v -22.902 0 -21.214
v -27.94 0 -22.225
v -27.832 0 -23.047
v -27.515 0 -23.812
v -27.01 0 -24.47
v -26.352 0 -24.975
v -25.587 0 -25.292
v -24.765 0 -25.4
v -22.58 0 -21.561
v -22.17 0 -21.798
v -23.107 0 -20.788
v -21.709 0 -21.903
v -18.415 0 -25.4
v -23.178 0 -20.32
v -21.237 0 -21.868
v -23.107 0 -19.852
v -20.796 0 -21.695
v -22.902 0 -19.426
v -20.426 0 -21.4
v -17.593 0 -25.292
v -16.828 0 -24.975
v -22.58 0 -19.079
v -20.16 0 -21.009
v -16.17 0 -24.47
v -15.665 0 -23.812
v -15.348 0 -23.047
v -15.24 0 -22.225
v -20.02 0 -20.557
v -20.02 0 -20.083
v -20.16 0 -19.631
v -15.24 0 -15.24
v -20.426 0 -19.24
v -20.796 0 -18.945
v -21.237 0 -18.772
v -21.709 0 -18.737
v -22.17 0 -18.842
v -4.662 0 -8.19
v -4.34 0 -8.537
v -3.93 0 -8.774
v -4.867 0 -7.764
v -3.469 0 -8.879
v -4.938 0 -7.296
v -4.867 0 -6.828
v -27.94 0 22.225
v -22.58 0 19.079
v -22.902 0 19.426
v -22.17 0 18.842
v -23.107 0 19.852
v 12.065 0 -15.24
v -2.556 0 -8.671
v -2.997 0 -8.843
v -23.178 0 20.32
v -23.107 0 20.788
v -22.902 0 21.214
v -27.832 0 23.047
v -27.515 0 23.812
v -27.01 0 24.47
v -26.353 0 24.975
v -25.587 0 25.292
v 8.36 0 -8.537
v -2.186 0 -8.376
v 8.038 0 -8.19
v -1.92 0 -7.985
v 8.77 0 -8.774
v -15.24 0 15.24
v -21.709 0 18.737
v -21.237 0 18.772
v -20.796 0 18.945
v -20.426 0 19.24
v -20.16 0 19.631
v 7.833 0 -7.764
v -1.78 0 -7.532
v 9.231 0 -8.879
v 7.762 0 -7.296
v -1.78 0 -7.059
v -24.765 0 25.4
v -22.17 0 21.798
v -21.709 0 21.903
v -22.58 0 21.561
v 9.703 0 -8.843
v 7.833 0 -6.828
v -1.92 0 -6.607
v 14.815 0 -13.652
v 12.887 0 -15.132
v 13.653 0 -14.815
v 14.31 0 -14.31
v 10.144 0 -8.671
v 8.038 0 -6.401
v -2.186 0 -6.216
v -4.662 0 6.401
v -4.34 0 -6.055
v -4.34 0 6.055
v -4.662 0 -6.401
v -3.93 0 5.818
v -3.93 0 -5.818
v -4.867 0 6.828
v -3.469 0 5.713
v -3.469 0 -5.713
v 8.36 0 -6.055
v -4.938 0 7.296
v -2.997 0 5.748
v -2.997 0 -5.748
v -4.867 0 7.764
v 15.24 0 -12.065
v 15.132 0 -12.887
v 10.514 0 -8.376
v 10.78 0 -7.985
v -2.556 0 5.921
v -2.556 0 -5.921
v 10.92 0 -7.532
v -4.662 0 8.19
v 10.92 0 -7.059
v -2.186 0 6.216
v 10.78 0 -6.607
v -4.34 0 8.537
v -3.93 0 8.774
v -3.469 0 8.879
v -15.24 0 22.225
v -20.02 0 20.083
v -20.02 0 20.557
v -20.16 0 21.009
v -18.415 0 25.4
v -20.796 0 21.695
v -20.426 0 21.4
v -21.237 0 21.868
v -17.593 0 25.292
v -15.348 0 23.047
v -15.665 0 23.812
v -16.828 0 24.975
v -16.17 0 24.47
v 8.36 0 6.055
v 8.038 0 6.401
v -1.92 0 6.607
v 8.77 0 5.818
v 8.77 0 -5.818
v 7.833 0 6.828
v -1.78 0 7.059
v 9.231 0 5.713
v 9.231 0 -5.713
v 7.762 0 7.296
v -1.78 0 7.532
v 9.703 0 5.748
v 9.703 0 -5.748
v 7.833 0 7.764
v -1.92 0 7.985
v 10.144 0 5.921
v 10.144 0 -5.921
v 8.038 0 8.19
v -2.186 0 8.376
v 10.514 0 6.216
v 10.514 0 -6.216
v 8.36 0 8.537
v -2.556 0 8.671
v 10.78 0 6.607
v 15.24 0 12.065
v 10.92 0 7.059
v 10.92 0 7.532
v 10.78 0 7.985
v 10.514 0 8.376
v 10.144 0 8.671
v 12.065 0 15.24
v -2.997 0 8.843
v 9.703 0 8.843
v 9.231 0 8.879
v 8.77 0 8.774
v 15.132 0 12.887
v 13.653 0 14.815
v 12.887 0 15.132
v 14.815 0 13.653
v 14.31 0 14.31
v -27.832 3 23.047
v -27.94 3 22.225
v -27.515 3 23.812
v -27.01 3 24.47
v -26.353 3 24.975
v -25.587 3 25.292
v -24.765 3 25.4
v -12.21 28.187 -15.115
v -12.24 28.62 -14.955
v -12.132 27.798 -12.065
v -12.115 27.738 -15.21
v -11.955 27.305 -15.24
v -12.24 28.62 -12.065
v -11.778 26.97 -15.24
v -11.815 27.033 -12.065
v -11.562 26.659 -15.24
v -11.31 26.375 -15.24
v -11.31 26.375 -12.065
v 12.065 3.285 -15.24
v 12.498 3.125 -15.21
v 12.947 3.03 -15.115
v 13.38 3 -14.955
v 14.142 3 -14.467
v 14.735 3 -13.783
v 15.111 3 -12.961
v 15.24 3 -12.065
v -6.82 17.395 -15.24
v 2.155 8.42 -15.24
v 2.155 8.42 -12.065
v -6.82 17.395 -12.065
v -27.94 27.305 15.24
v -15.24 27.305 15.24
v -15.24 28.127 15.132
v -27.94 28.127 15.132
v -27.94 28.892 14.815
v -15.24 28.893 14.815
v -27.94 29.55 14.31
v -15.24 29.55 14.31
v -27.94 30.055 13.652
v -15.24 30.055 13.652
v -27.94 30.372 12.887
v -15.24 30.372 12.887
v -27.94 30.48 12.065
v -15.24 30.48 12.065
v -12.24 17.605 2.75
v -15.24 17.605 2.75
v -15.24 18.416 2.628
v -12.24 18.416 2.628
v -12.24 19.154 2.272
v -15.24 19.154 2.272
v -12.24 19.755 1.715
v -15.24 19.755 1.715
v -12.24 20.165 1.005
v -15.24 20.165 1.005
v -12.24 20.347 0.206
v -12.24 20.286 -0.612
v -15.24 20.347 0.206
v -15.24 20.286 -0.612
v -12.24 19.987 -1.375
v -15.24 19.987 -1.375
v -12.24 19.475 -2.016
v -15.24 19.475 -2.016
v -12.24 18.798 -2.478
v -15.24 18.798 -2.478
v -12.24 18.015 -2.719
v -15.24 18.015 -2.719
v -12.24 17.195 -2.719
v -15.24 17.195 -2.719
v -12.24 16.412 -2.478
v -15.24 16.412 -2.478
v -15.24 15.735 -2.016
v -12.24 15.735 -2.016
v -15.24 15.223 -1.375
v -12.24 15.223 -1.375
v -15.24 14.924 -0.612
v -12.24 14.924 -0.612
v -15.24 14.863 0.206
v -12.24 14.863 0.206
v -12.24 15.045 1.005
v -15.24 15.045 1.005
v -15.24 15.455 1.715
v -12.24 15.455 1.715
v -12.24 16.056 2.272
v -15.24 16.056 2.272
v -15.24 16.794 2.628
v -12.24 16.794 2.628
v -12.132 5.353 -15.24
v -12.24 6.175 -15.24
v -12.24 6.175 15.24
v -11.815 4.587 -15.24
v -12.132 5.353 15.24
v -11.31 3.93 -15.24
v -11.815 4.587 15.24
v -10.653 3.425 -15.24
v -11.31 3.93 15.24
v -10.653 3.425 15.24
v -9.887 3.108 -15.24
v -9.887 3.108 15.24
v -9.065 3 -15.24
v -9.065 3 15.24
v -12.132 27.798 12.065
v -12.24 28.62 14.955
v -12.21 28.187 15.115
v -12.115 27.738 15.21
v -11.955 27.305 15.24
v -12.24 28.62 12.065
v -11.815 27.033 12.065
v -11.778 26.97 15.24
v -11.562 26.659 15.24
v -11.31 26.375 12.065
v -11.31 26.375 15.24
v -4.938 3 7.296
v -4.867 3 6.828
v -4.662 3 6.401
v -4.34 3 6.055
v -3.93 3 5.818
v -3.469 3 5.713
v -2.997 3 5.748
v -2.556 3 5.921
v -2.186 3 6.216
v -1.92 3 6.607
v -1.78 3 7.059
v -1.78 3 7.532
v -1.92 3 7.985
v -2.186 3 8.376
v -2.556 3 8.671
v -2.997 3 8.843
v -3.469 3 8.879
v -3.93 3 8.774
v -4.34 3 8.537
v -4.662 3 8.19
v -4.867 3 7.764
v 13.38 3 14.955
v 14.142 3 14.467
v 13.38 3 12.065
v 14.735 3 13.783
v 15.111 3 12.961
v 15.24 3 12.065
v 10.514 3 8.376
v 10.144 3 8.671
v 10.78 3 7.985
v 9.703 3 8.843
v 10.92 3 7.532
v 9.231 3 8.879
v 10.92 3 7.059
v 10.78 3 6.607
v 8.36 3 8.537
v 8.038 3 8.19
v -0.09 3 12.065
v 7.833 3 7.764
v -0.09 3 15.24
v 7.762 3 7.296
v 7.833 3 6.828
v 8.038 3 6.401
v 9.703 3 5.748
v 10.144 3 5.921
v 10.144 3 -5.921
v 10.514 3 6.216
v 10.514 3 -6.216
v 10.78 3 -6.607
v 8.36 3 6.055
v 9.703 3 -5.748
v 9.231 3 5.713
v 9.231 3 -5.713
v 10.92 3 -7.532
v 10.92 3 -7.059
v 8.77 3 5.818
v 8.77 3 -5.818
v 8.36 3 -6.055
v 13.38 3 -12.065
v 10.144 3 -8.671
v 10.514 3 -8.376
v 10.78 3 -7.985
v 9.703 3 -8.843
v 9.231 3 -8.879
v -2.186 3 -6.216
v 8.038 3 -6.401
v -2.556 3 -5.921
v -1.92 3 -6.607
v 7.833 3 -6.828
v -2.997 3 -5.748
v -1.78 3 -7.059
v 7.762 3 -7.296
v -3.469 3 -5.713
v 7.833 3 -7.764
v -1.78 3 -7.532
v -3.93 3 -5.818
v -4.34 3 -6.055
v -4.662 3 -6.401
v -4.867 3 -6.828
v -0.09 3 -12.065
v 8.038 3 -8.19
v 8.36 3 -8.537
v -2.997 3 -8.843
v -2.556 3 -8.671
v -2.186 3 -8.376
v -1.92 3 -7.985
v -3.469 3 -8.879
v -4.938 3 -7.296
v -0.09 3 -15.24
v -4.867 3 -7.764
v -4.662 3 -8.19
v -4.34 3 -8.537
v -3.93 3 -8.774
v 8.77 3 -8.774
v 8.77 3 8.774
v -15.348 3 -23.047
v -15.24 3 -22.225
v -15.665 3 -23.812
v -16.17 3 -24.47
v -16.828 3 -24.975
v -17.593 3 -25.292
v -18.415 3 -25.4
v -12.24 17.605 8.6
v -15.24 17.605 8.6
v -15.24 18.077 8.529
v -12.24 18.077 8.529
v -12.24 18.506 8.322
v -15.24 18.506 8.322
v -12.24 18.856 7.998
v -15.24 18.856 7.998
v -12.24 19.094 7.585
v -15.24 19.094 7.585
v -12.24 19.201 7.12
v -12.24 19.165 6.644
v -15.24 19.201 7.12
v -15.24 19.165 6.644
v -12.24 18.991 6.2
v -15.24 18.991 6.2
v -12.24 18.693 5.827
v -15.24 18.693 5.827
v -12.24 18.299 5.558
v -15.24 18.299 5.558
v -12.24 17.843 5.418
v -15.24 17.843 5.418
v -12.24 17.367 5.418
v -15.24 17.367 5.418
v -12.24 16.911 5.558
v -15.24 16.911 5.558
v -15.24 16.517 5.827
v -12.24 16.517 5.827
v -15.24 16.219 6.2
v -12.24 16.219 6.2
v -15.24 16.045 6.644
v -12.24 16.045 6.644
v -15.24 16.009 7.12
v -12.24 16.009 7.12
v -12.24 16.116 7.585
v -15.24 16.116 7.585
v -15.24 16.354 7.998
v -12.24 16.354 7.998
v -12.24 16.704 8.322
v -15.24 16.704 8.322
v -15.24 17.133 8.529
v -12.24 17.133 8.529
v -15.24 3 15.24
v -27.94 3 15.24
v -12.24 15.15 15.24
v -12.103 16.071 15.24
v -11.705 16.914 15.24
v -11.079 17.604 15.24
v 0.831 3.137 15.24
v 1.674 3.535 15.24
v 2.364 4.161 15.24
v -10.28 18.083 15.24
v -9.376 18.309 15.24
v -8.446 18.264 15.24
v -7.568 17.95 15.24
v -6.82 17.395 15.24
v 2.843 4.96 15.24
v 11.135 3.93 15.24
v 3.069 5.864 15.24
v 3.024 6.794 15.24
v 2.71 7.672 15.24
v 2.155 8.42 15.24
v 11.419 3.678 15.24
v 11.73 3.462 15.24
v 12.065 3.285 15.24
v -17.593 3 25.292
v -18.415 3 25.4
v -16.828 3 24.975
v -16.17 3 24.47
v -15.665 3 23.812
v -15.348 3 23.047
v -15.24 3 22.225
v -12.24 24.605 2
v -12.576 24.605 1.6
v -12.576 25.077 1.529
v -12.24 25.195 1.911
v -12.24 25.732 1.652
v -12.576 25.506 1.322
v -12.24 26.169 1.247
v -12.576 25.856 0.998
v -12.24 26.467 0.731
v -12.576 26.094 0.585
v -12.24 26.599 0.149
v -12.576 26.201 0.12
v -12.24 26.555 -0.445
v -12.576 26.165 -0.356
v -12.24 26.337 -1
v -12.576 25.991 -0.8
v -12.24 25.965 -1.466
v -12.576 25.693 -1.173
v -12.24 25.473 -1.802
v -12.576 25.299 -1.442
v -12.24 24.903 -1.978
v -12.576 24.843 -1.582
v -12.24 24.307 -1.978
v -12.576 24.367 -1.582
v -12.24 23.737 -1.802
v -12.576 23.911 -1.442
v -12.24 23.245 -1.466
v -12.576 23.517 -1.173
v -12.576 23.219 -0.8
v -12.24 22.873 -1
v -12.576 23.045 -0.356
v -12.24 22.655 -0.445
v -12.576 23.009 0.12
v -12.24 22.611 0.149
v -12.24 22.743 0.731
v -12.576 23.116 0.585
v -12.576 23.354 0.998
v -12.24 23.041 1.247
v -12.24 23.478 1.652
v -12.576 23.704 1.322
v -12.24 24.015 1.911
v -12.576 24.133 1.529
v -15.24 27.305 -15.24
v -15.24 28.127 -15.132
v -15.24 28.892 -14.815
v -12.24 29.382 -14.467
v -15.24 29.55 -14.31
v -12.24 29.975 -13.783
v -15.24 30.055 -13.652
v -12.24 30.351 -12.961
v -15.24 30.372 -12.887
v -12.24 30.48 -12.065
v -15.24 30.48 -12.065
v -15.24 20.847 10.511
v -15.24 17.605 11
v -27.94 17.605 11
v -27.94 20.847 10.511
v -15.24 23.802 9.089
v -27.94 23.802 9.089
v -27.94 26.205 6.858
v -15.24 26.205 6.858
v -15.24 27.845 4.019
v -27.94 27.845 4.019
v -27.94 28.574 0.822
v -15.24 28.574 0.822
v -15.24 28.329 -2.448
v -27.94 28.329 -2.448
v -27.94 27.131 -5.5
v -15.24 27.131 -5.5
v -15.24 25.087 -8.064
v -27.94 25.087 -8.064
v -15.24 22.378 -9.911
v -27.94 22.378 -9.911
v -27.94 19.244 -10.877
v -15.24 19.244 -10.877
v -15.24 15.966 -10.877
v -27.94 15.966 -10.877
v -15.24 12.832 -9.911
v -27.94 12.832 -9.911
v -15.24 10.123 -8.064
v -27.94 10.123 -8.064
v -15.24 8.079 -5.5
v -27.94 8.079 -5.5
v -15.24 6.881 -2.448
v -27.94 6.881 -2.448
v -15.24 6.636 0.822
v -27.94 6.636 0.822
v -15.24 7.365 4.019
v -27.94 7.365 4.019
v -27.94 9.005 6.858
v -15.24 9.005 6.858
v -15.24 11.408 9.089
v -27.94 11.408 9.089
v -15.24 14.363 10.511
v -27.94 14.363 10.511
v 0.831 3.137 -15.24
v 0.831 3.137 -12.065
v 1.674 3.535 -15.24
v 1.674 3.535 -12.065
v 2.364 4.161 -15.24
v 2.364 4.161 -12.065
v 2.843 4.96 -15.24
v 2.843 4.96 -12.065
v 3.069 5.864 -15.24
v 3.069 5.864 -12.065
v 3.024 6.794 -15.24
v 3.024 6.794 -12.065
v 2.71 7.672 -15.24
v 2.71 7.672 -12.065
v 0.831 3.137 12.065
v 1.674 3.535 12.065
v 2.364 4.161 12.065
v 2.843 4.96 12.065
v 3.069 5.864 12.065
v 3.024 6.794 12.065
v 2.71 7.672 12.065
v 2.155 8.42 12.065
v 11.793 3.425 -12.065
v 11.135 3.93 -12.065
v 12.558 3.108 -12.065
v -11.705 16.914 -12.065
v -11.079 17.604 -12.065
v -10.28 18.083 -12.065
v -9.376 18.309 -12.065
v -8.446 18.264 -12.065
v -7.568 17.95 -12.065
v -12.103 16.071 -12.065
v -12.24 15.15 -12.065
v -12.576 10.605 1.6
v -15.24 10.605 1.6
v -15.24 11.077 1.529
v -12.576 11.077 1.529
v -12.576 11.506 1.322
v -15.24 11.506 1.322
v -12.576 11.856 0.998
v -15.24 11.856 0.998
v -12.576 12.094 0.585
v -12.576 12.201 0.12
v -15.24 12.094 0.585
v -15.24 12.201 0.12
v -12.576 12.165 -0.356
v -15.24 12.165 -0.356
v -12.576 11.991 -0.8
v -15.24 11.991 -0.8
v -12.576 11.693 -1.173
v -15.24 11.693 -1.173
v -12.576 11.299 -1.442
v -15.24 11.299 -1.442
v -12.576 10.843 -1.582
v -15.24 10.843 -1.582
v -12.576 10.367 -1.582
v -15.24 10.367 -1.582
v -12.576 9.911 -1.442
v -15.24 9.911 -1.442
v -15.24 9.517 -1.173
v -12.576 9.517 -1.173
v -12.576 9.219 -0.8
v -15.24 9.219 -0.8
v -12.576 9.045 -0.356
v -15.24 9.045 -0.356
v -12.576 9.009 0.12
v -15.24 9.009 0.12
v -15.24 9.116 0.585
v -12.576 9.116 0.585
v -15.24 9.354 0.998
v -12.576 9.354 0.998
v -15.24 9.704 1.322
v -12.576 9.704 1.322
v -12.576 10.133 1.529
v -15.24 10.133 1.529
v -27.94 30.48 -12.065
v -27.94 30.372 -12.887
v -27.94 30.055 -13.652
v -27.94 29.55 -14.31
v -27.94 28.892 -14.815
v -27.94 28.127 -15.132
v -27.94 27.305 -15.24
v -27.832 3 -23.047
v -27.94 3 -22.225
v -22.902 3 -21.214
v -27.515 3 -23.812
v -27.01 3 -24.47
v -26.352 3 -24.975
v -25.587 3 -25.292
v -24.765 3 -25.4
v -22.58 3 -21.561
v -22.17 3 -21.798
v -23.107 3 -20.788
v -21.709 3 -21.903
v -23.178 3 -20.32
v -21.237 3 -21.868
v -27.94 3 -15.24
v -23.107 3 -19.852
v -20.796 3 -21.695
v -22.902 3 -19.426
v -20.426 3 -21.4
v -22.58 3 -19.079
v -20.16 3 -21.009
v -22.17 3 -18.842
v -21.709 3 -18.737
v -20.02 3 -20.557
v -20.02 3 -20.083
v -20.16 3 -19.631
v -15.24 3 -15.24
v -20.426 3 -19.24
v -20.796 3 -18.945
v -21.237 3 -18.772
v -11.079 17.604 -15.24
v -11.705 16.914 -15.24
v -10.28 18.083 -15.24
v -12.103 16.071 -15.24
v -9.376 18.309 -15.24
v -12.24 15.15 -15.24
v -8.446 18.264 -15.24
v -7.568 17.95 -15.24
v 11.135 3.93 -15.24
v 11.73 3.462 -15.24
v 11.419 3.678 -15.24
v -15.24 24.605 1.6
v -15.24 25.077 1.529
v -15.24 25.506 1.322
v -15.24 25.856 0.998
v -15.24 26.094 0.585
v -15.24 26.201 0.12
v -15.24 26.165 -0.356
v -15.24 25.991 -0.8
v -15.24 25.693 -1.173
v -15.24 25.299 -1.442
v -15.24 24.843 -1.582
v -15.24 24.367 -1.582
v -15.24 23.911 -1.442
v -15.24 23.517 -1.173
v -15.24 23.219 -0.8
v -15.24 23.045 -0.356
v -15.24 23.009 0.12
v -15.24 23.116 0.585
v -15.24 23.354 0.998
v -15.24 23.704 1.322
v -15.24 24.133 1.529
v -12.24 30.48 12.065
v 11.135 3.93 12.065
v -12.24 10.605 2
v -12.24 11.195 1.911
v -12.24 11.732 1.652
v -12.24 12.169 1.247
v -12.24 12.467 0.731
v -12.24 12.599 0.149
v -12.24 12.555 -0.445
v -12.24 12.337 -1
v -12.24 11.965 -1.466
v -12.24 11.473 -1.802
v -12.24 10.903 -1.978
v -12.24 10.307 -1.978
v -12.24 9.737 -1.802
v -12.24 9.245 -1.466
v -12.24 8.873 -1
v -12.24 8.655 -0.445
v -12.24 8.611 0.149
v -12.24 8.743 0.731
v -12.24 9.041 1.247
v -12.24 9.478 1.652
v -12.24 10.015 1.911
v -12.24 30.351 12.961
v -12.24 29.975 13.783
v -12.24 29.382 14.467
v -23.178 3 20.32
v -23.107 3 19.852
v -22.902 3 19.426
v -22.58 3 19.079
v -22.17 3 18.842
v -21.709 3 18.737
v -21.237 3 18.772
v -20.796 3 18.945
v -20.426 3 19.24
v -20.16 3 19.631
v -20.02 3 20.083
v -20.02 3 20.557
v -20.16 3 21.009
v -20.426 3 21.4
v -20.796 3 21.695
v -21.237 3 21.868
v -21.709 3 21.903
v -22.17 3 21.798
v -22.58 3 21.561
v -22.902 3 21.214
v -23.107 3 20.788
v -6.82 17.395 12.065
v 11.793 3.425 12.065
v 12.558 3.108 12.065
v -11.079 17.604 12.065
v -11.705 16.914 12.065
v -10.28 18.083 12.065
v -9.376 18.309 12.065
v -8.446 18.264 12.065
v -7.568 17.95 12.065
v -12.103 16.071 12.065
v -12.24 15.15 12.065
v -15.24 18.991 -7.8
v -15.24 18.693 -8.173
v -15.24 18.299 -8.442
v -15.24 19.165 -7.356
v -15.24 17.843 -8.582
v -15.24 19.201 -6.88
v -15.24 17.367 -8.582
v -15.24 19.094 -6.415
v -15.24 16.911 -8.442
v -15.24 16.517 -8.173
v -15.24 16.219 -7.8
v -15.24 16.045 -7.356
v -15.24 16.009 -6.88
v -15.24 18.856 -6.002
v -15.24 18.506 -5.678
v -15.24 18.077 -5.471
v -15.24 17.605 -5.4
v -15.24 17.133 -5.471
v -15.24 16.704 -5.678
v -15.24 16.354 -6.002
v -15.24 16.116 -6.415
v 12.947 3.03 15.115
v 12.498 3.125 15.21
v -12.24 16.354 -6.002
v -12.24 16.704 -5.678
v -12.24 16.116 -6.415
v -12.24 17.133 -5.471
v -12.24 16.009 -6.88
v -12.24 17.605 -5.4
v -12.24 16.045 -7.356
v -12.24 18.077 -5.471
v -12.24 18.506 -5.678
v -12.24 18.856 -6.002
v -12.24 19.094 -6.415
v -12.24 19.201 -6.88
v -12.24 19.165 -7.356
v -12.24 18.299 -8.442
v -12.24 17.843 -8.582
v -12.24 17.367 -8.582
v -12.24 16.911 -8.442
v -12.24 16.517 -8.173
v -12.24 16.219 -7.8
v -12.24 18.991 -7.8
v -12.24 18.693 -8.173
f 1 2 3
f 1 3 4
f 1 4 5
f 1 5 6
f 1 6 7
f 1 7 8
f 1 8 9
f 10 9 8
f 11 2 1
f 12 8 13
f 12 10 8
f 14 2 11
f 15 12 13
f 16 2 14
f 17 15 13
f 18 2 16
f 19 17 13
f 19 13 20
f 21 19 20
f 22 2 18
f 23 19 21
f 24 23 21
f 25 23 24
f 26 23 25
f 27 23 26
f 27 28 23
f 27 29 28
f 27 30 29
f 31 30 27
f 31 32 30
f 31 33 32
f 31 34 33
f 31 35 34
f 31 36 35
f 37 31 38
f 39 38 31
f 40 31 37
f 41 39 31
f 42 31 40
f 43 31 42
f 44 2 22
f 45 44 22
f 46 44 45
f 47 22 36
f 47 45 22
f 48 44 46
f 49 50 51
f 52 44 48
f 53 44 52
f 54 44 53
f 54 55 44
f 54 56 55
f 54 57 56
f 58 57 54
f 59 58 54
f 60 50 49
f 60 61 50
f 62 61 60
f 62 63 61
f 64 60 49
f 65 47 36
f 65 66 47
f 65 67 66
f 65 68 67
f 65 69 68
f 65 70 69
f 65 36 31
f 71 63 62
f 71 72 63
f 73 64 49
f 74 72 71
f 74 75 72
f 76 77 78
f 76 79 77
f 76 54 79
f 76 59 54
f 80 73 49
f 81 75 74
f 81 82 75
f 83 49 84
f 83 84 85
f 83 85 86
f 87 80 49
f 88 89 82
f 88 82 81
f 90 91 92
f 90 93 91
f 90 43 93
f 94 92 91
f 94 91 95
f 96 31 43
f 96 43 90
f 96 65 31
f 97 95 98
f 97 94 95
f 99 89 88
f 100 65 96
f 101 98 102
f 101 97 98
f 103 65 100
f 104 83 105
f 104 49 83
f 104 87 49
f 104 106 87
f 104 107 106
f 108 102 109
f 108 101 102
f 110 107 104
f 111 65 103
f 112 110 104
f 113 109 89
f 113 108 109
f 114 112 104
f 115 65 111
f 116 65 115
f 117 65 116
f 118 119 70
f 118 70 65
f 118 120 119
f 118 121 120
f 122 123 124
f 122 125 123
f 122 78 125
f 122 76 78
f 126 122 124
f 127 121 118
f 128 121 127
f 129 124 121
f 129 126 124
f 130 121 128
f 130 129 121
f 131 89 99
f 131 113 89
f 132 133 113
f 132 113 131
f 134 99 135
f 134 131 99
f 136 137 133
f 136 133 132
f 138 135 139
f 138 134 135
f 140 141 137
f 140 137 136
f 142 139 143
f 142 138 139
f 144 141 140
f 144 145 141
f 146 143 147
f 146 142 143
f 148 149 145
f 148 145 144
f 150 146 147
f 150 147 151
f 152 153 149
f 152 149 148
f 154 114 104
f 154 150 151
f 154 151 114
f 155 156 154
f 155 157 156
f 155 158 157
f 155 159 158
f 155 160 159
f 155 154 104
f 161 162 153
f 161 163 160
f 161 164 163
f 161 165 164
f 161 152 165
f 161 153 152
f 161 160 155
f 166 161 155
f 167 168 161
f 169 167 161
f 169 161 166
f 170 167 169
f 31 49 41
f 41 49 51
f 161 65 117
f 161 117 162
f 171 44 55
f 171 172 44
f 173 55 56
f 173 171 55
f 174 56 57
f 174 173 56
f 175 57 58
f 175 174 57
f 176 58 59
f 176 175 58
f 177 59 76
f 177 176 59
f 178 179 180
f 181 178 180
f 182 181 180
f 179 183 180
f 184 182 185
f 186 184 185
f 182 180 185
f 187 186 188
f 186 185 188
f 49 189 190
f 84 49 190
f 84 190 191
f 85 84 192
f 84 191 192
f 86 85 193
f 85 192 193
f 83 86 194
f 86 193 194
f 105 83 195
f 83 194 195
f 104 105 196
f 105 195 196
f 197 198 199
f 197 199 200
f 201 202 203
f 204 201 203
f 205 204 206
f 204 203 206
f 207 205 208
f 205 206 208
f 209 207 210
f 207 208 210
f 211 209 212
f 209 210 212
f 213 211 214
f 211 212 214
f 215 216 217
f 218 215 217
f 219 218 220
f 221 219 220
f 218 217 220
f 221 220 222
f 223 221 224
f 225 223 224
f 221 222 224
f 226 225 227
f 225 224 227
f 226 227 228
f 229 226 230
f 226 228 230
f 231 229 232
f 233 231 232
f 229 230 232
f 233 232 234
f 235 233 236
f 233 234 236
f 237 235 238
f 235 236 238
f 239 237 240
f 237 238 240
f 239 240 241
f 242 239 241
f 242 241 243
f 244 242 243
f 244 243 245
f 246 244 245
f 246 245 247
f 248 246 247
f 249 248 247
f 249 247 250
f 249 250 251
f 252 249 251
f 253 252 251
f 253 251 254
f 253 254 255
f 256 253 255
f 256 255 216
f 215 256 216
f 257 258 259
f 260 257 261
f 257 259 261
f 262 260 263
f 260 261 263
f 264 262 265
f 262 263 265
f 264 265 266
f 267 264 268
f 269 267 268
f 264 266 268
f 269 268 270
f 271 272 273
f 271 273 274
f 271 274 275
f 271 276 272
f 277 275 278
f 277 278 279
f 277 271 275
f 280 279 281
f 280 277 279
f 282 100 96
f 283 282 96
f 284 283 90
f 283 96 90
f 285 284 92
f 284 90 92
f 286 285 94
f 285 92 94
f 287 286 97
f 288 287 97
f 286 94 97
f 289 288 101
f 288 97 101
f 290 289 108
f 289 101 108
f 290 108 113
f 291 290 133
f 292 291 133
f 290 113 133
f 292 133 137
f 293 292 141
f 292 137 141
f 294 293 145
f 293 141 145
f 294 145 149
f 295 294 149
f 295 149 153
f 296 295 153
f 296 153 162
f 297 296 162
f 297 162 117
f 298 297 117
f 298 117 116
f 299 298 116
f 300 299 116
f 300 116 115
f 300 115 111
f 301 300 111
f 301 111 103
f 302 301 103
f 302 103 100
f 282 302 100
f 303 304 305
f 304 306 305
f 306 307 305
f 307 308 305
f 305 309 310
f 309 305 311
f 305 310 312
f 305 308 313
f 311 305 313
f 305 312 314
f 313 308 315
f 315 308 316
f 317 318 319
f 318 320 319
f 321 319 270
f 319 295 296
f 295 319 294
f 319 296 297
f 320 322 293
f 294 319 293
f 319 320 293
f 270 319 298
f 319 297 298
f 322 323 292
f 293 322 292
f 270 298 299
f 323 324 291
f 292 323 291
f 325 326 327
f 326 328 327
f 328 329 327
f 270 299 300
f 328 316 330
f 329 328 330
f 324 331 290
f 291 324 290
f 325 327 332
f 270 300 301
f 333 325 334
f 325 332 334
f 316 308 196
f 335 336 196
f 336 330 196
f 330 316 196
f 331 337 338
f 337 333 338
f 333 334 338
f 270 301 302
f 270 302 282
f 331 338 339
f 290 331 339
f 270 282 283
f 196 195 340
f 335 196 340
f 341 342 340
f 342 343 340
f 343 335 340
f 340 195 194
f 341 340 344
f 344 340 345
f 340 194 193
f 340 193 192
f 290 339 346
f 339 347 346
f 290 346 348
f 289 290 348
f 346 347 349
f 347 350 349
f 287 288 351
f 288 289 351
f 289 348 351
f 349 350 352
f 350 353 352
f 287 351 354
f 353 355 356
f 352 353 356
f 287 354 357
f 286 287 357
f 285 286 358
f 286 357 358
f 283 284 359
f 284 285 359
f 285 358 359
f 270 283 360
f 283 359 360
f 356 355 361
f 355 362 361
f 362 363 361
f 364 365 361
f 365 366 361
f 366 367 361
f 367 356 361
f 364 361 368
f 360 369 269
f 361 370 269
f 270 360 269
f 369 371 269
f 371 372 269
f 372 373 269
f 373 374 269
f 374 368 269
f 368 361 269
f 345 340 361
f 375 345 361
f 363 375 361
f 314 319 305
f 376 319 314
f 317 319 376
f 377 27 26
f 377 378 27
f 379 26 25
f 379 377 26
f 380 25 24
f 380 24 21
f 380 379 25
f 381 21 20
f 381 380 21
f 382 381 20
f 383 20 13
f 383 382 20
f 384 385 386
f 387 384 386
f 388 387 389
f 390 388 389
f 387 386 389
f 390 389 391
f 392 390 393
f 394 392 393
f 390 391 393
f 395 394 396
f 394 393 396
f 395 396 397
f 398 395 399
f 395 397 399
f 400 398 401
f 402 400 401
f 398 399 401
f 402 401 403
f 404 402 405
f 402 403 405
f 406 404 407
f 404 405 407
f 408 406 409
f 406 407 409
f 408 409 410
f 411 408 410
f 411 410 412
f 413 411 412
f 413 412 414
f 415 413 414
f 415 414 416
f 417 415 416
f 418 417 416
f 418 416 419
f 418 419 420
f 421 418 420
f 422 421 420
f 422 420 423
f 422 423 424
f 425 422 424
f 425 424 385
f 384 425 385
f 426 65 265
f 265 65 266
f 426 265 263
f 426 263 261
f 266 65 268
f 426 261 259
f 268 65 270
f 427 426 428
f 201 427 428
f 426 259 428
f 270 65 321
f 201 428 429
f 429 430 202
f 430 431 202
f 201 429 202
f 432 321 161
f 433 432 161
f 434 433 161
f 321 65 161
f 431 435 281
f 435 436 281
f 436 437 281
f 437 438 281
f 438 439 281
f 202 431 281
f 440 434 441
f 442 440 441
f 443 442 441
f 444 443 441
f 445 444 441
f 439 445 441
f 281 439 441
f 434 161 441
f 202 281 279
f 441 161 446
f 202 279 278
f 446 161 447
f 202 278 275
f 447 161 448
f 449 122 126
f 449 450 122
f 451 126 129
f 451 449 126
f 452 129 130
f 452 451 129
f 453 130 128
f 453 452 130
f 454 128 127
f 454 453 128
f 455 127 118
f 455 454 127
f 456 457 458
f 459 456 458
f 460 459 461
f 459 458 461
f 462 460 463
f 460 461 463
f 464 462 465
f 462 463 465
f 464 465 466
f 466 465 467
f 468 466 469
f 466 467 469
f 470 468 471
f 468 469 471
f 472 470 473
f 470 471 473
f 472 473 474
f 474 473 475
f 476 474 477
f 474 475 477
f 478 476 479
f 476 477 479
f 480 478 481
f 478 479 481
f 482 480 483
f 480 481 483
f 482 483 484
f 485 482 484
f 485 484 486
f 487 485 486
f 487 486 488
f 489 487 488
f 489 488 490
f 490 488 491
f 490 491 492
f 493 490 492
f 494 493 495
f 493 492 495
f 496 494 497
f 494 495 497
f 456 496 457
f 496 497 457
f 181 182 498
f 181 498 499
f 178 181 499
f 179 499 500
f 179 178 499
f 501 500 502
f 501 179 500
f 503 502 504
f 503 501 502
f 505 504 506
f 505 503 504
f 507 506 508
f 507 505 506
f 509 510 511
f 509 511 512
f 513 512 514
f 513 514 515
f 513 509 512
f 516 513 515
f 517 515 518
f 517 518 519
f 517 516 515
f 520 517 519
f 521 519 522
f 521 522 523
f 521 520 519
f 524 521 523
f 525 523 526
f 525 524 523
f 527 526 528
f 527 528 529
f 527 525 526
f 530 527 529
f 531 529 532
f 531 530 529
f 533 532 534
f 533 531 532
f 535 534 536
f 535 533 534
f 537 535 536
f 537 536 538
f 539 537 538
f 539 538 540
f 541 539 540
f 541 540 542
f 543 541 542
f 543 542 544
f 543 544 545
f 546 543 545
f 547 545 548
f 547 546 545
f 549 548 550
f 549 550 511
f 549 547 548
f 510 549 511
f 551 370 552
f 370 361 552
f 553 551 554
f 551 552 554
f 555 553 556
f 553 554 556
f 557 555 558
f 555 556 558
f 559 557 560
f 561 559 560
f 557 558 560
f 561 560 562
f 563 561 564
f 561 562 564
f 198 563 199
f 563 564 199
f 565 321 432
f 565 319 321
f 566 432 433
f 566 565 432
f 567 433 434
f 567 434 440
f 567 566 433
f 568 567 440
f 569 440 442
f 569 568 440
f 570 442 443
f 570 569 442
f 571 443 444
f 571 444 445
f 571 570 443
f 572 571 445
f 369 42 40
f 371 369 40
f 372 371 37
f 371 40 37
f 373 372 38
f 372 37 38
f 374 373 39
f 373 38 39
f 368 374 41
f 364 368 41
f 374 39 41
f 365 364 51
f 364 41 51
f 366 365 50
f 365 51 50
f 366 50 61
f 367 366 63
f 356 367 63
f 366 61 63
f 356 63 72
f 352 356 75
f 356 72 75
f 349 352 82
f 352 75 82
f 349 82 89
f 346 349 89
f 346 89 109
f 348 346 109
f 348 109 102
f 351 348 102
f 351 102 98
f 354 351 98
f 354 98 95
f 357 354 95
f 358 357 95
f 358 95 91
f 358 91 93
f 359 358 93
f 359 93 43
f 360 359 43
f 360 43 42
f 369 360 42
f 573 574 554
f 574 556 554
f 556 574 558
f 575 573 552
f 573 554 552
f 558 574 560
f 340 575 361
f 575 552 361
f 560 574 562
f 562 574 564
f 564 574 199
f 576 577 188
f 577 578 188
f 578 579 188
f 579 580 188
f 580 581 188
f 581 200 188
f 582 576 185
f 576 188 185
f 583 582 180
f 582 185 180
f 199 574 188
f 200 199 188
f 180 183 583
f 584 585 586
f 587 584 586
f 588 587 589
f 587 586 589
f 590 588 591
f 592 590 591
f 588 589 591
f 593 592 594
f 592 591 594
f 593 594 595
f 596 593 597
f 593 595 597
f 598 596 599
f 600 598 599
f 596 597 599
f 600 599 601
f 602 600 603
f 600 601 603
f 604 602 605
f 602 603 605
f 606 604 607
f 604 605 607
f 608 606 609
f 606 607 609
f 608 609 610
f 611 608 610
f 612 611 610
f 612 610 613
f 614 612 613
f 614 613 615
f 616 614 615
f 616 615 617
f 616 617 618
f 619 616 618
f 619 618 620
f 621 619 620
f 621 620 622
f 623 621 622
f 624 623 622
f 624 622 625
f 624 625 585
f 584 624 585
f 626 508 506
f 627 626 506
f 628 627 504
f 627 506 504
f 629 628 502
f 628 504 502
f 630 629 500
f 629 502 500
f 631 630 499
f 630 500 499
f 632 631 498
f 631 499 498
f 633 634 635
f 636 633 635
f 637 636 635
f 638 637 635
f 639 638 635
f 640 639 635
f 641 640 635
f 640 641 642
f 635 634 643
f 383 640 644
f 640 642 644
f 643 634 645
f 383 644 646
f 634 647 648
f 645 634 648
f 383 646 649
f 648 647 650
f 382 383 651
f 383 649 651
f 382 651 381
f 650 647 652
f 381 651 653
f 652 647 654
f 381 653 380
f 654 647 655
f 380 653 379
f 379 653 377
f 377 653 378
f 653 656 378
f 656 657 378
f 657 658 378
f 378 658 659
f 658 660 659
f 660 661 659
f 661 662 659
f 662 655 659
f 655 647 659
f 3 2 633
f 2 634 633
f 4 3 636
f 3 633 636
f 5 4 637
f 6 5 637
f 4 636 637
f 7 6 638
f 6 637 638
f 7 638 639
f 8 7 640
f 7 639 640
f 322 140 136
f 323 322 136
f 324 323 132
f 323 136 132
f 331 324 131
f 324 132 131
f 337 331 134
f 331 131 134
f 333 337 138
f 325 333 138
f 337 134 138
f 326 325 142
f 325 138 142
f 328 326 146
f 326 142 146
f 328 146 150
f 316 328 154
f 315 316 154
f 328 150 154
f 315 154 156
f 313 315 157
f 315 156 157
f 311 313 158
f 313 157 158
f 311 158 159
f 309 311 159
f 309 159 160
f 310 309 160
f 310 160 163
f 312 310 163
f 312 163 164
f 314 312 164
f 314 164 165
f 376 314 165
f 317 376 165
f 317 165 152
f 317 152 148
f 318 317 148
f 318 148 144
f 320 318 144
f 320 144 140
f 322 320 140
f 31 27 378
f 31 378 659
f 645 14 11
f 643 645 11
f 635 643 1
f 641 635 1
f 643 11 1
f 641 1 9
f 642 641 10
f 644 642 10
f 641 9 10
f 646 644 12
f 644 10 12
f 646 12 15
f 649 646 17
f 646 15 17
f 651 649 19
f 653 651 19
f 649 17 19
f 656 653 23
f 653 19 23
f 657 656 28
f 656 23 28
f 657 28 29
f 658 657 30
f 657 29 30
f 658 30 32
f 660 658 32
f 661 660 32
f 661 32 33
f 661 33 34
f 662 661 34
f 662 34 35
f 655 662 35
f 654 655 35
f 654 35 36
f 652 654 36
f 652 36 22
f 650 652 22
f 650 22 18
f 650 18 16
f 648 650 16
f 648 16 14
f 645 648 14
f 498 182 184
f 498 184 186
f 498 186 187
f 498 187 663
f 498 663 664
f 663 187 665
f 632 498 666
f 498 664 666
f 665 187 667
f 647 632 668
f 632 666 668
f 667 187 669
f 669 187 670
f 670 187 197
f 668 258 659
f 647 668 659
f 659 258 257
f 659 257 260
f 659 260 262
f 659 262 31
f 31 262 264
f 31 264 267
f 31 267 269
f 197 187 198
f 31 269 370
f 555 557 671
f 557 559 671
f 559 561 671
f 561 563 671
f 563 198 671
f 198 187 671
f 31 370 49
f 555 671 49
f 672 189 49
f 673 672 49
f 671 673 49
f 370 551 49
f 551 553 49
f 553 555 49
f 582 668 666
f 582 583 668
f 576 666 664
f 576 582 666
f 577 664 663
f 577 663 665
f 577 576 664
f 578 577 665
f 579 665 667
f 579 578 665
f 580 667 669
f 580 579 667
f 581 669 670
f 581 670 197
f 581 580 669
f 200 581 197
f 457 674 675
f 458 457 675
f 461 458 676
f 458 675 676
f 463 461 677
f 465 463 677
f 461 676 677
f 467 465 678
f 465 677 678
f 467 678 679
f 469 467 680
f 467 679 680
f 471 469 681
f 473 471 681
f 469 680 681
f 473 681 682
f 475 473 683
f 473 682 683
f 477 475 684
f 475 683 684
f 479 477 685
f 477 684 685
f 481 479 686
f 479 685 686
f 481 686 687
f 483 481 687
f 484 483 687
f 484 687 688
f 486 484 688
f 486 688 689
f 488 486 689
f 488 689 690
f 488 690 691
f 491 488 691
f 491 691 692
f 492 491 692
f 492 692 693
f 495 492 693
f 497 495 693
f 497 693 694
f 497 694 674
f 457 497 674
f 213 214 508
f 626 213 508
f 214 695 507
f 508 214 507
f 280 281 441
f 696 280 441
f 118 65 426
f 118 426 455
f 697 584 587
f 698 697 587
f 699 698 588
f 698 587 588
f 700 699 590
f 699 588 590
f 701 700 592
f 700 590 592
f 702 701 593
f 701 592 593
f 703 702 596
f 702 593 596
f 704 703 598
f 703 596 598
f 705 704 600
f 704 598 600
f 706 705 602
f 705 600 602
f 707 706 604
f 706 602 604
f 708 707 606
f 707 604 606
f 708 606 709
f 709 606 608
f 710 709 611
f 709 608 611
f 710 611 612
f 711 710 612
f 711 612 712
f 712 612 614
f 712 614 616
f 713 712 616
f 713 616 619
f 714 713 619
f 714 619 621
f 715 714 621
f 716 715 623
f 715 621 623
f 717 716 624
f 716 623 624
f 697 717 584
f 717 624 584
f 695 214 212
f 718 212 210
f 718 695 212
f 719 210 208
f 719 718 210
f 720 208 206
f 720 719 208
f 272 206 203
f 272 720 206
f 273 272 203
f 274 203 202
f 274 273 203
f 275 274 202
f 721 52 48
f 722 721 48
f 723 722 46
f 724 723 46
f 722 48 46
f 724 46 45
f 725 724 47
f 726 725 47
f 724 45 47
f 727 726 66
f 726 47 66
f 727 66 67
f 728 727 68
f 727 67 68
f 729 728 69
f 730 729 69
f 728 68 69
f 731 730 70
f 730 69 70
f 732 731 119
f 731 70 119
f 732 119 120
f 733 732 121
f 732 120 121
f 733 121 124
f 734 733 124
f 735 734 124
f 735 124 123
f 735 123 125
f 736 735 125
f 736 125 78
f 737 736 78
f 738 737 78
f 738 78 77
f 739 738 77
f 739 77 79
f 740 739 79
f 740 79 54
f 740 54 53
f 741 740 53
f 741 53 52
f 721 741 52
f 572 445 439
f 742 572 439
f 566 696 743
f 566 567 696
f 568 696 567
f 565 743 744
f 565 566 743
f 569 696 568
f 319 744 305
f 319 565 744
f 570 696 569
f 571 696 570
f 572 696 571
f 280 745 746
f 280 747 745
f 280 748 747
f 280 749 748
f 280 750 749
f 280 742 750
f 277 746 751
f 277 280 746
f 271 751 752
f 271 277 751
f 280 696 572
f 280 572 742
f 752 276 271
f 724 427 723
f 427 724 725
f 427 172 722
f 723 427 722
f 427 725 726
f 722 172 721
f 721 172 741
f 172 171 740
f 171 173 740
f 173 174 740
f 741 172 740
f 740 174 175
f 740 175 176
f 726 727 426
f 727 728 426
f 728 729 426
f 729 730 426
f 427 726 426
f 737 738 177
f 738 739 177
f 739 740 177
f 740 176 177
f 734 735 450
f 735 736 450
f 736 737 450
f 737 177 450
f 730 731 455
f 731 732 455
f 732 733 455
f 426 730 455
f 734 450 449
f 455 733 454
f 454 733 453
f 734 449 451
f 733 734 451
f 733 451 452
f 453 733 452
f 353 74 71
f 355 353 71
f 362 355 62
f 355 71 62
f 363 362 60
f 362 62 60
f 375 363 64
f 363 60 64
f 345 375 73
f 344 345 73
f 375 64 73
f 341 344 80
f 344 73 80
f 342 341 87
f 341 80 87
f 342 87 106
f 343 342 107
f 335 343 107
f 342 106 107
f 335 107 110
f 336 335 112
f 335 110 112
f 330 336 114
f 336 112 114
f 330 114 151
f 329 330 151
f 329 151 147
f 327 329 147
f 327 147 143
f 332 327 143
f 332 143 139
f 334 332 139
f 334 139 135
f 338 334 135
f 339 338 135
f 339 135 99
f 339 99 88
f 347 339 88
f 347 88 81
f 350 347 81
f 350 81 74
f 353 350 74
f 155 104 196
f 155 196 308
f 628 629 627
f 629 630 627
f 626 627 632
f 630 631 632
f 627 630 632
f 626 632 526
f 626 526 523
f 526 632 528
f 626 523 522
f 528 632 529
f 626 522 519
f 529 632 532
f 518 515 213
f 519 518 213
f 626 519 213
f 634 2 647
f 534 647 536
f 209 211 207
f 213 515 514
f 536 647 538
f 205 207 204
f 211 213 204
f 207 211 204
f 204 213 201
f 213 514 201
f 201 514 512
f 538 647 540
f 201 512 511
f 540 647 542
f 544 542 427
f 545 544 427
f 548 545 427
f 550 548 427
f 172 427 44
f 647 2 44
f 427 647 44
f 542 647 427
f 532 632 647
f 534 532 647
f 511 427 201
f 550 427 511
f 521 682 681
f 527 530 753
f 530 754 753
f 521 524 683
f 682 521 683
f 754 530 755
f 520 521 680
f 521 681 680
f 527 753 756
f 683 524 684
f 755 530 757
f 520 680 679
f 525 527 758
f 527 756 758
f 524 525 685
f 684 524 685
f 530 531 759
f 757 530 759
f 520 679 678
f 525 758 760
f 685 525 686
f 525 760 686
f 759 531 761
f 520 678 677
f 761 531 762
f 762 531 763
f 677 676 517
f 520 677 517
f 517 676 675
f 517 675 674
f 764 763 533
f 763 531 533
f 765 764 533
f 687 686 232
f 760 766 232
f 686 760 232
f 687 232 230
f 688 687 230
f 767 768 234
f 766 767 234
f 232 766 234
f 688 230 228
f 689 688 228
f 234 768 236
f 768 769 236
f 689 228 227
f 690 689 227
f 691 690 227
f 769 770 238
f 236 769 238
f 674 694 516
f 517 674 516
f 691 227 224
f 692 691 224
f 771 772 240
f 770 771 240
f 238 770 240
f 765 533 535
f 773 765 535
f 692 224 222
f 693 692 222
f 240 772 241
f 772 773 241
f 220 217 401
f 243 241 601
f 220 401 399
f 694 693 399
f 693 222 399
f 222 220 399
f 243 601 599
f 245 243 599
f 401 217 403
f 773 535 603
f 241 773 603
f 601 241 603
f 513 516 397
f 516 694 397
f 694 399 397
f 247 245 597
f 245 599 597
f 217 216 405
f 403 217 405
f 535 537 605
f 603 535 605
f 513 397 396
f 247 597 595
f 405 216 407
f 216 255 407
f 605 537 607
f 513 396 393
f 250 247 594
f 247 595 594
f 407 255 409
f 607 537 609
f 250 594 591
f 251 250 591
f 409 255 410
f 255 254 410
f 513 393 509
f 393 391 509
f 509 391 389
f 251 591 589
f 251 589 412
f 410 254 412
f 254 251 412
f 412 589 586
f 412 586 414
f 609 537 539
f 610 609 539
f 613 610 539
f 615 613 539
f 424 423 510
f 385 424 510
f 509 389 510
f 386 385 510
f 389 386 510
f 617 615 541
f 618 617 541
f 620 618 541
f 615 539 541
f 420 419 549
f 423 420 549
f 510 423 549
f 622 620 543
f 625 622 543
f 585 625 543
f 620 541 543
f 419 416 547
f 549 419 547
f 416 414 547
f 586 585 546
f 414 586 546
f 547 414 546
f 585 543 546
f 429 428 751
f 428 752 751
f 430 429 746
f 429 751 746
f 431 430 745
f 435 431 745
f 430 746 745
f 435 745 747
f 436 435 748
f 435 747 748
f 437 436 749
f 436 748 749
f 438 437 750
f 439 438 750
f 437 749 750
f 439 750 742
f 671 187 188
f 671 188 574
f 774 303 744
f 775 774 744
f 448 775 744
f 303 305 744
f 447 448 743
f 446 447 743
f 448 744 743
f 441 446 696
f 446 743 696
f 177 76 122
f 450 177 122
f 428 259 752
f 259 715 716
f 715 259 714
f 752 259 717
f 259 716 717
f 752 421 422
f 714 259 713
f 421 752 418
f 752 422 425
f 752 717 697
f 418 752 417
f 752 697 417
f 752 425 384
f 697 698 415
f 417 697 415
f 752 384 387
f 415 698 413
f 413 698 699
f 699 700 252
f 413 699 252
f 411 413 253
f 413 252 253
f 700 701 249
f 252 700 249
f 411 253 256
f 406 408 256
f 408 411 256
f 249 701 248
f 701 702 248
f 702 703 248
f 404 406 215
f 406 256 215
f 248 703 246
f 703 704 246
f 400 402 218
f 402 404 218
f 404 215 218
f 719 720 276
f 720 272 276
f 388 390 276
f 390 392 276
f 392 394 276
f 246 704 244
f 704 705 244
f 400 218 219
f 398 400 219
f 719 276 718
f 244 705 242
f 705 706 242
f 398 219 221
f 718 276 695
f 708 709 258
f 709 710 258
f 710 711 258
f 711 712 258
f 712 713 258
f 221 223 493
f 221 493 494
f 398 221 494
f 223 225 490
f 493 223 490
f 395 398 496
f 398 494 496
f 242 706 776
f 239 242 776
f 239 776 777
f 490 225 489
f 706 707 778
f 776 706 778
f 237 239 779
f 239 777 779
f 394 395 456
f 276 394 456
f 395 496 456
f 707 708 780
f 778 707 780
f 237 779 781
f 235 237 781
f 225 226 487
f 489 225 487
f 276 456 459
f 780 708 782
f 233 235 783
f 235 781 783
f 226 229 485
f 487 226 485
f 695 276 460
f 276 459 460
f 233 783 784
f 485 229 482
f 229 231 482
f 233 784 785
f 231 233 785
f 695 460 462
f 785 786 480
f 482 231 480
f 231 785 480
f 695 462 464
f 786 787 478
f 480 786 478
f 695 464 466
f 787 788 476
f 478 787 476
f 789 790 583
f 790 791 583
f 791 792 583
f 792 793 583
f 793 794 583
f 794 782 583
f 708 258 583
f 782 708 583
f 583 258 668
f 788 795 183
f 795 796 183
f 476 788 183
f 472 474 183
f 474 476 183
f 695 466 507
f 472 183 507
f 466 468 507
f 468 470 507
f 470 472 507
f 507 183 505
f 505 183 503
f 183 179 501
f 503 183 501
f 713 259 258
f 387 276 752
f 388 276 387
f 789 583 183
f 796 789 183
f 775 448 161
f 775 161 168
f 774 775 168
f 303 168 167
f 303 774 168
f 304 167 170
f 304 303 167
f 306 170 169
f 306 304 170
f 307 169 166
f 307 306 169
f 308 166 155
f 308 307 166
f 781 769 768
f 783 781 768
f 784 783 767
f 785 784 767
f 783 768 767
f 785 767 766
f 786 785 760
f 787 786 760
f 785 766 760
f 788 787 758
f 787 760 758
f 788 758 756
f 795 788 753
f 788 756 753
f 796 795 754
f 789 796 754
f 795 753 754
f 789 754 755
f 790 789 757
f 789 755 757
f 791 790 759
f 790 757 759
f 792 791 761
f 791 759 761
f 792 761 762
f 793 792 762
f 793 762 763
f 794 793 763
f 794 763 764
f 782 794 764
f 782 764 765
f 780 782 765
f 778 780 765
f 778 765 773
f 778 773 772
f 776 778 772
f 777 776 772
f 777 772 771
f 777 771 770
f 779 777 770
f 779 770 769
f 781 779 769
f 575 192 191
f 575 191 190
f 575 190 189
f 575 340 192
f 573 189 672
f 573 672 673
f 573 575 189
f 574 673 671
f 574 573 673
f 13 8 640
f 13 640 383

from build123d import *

# Parameters (mm, degrees)
SKETCH1_W                      = 30.48
SKETCH1_H                      = 30.48
BOSS_EXTRUDE1_DEPTH            = 30.48
SKETCH2_W                      = 27.48
SKETCH2_H                      = 27.48
CUT_EXTRUDE1_DEPTH             = 46.72
F_10_CLEARANCE_HOLE1_D         = 5.5
F_4_CLEARANCE_HOLE1_D          = 3.2
CHAMFER1_SIZE                  = 0.399999962
CHAMFER1_SIZE2                 = 0.335639821
FILLET1_R                      = 3.175
BOSS_EXTRUDE2_DEPTH            = 3.175
SKETCH20_R                     = 11
BOSS_EXTRUDE3_DEPTH            = 12.7
SKETCH21_W                     = 12.7
SKETCH21_H                     = 50.8
BOSS_EXTRUDE4_DEPTH            = 3
FILLET2_R                      = 3.175
F_1_8_0_1250_DOWEL_HOLE1_D     = 3.175
F_1_8_0_1250_DOWEL_HOLE1_DEPTH = 6.35
F_1_8_0_1250_DOWEL_HOLE1_TIP   = 0.953866233
F_1_8_0_1250_DOWEL_HOLE2_D     = 3.175
F_1_8_0_1250_DOWEL_HOLE2_DEPTH = 6.35
F_1_8_0_1250_DOWEL_HOLE2_TIP   = 0.953866233


with BuildPart() as part:
    # Sketch1 → Boss-Extrude1 (new body)
    with BuildSketch(Plane.XZ):
        Rectangle(SKETCH1_W, SKETCH1_H)
    extrude(amount=-BOSS_EXTRUDE1_DEPTH)

    # Sketch2 → Cut-Extrude1 (cut, through all)
    with BuildSketch(Plane(origin=(0, 0, -15.24), x_dir=(-1, 0, 0), z_dir=(0, 0, -1))):
        with Locations((-1.5, 16.74)):
            Rectangle(SKETCH2_W, SKETCH2_H)
    extrude(amount=-CUT_EXTRUDE1_DEPTH, mode=Mode.SUBTRACT)

    # #10 Clearance Hole1 (through all)
    with Locations(Plane(origin=(-12.24, 0, 0), x_dir=(0, 0, -1), z_dir=(1, 0, 0))):
        with Locations((0, 17.605)):
            Hole(F_10_CLEARANCE_HOLE1_D / 2)

    # #4 Clearance Hole1 (through all)
    with Locations(Plane(origin=(-12.24, 0, 0), x_dir=(0, 0, -1), z_dir=(1, 0, 0))):
        with Locations((-7, 17.605), (7, 17.605), (0, 24.605), (0, 10.605)):
            Hole(F_4_CLEARANCE_HOLE1_D / 2)

    # Chamfer1
    chamfer1_edges = [part.edges().sort_by_distance(p)[0] for p in [
        (-12.24, 10.605, -1.6),
        (-12.24, 24.605, -1.6),
    ]]
    chamfer1_side = [part.faces().sort_by_distance(p)[0] for p in [
        (-12.24, 16.74, -14.829612281),
    ]]
    chamfer(chamfer1_edges, length=CHAMFER1_SIZE, length2=CHAMFER1_SIZE2, reference=chamfer1_side[0])

    # Fillet1
    fillet1_edges = [part.edges().sort_by_distance(p)[0] for p in [
        (-13.74, 30.48, 15.24),
        (15.24, 1.5, -15.24),
        (15.24, 1.5, 15.24),
        (-12.24, 3, 0),
        (-13.74, 30.48, -15.24),
    ]]
    fillet(fillet1_edges, radius=FILLET1_R)

    # Sketch11 → Boss-Extrude2 (add)
    with BuildSketch(Plane.XY.offset(15.24)):
        Polygon((-12.24, 27.305), (12.065, 3), (7.574871939, 3), (-12.24, 22.814871939), align=None)
    boss_extrude2 = extrude(amount=-BOSS_EXTRUDE2_DEPTH)

    # Mirror1: Boss-Extrude2 across plane
    add(boss_extrude2.mirror(Plane(origin=(0, 0, 0), x_dir=(1, 0, 0), z_dir=(0, 0, -1))))

    # Sketch20 → Boss-Extrude3 (add)
    with BuildSketch(Plane.ZY.offset(15.24)):
        with BuildLine():
            Line((15.24, 0), (15.24, 27.305))
            ThreePointArc((15.24, 27.305), (14.31006403, 29.55006403), (12.065, 30.48))
            Line((12.065, 30.48), (-12.065, 30.48))
            ThreePointArc((-12.065, 30.48), (-14.31006403, 29.55006403), (-15.24, 27.305))
            Line((-15.24, 27.305), (-15.24, 0))
            Line((-15.24, 0), (15.24, 0))
        make_face()
        with Locations((0, 17.605)):
            Circle(SKETCH20_R, mode=Mode.SUBTRACT)
    extrude(amount=BOSS_EXTRUDE3_DEPTH)

    # Sketch21 → Boss-Extrude4 (add)
    with BuildSketch(Plane.XZ):
        with Locations((-21.59, 0)):
            Rectangle(SKETCH21_W, SKETCH21_H)
    extrude(amount=-BOSS_EXTRUDE4_DEPTH)

    # Fillet2
    fillet2_edges = [part.edges().sort_by_distance(p)[0] for p in [
        (-12.24, 27.305, -13.6525),
        (-12.24, 22.814871939, -13.6525),
        (7.574871939, 3, -13.6525),
        (12.065, 3, -13.6525),
        (-15.24, 1.5, 25.4),
        (-27.94, 1.5, -25.4),
        (-27.94, 1.5, 25.4),
        (-15.24, 1.5, -25.4),
        (-12.24, 22.814871939, 13.6525),
        (-12.24, 27.305, 13.6525),
        (12.065, 3, 13.6525),
        (7.574871939, 3, 13.6525),
    ]]
    fillet(fillet2_edges, radius=FILLET2_R)

    # 1/8 (0.1250) Dowel Hole1
    with Locations(Plane(origin=(0, 3, 0), x_dir=(1, 0, 0), z_dir=(0, 1, 0))):
        with Locations((-3.35, 7.29577013), (9.35, 7.29577013), (9.35, -7.29577013), (-3.35, -7.29577013)):
            Hole(F_1_8_0_1250_DOWEL_HOLE1_D / 2, depth=F_1_8_0_1250_DOWEL_HOLE1_DEPTH)
            with Locations((0, 0, -(F_1_8_0_1250_DOWEL_HOLE1_DEPTH + F_1_8_0_1250_DOWEL_HOLE1_TIP / 2))):  # 118° drill point
                Cone(0, F_1_8_0_1250_DOWEL_HOLE1_D / 2, F_1_8_0_1250_DOWEL_HOLE1_TIP, mode=Mode.SUBTRACT)

    # 1/8 (0.1250) Dowel Hole2
    with Locations(Plane(origin=(0, 3, 0), x_dir=(1, 0, 0), z_dir=(0, 1, 0))):
        with Locations((-21.59, 20.32), (-21.59, -20.32)):
            Hole(F_1_8_0_1250_DOWEL_HOLE2_D / 2, depth=F_1_8_0_1250_DOWEL_HOLE2_DEPTH)
            with Locations((0, 0, -(F_1_8_0_1250_DOWEL_HOLE2_DEPTH + F_1_8_0_1250_DOWEL_HOLE2_TIP / 2))):  # 118° drill point
                Cone(0, F_1_8_0_1250_DOWEL_HOLE2_D / 2, F_1_8_0_1250_DOWEL_HOLE2_TIP, mode=Mode.SUBTRACT)


solid = part.part
